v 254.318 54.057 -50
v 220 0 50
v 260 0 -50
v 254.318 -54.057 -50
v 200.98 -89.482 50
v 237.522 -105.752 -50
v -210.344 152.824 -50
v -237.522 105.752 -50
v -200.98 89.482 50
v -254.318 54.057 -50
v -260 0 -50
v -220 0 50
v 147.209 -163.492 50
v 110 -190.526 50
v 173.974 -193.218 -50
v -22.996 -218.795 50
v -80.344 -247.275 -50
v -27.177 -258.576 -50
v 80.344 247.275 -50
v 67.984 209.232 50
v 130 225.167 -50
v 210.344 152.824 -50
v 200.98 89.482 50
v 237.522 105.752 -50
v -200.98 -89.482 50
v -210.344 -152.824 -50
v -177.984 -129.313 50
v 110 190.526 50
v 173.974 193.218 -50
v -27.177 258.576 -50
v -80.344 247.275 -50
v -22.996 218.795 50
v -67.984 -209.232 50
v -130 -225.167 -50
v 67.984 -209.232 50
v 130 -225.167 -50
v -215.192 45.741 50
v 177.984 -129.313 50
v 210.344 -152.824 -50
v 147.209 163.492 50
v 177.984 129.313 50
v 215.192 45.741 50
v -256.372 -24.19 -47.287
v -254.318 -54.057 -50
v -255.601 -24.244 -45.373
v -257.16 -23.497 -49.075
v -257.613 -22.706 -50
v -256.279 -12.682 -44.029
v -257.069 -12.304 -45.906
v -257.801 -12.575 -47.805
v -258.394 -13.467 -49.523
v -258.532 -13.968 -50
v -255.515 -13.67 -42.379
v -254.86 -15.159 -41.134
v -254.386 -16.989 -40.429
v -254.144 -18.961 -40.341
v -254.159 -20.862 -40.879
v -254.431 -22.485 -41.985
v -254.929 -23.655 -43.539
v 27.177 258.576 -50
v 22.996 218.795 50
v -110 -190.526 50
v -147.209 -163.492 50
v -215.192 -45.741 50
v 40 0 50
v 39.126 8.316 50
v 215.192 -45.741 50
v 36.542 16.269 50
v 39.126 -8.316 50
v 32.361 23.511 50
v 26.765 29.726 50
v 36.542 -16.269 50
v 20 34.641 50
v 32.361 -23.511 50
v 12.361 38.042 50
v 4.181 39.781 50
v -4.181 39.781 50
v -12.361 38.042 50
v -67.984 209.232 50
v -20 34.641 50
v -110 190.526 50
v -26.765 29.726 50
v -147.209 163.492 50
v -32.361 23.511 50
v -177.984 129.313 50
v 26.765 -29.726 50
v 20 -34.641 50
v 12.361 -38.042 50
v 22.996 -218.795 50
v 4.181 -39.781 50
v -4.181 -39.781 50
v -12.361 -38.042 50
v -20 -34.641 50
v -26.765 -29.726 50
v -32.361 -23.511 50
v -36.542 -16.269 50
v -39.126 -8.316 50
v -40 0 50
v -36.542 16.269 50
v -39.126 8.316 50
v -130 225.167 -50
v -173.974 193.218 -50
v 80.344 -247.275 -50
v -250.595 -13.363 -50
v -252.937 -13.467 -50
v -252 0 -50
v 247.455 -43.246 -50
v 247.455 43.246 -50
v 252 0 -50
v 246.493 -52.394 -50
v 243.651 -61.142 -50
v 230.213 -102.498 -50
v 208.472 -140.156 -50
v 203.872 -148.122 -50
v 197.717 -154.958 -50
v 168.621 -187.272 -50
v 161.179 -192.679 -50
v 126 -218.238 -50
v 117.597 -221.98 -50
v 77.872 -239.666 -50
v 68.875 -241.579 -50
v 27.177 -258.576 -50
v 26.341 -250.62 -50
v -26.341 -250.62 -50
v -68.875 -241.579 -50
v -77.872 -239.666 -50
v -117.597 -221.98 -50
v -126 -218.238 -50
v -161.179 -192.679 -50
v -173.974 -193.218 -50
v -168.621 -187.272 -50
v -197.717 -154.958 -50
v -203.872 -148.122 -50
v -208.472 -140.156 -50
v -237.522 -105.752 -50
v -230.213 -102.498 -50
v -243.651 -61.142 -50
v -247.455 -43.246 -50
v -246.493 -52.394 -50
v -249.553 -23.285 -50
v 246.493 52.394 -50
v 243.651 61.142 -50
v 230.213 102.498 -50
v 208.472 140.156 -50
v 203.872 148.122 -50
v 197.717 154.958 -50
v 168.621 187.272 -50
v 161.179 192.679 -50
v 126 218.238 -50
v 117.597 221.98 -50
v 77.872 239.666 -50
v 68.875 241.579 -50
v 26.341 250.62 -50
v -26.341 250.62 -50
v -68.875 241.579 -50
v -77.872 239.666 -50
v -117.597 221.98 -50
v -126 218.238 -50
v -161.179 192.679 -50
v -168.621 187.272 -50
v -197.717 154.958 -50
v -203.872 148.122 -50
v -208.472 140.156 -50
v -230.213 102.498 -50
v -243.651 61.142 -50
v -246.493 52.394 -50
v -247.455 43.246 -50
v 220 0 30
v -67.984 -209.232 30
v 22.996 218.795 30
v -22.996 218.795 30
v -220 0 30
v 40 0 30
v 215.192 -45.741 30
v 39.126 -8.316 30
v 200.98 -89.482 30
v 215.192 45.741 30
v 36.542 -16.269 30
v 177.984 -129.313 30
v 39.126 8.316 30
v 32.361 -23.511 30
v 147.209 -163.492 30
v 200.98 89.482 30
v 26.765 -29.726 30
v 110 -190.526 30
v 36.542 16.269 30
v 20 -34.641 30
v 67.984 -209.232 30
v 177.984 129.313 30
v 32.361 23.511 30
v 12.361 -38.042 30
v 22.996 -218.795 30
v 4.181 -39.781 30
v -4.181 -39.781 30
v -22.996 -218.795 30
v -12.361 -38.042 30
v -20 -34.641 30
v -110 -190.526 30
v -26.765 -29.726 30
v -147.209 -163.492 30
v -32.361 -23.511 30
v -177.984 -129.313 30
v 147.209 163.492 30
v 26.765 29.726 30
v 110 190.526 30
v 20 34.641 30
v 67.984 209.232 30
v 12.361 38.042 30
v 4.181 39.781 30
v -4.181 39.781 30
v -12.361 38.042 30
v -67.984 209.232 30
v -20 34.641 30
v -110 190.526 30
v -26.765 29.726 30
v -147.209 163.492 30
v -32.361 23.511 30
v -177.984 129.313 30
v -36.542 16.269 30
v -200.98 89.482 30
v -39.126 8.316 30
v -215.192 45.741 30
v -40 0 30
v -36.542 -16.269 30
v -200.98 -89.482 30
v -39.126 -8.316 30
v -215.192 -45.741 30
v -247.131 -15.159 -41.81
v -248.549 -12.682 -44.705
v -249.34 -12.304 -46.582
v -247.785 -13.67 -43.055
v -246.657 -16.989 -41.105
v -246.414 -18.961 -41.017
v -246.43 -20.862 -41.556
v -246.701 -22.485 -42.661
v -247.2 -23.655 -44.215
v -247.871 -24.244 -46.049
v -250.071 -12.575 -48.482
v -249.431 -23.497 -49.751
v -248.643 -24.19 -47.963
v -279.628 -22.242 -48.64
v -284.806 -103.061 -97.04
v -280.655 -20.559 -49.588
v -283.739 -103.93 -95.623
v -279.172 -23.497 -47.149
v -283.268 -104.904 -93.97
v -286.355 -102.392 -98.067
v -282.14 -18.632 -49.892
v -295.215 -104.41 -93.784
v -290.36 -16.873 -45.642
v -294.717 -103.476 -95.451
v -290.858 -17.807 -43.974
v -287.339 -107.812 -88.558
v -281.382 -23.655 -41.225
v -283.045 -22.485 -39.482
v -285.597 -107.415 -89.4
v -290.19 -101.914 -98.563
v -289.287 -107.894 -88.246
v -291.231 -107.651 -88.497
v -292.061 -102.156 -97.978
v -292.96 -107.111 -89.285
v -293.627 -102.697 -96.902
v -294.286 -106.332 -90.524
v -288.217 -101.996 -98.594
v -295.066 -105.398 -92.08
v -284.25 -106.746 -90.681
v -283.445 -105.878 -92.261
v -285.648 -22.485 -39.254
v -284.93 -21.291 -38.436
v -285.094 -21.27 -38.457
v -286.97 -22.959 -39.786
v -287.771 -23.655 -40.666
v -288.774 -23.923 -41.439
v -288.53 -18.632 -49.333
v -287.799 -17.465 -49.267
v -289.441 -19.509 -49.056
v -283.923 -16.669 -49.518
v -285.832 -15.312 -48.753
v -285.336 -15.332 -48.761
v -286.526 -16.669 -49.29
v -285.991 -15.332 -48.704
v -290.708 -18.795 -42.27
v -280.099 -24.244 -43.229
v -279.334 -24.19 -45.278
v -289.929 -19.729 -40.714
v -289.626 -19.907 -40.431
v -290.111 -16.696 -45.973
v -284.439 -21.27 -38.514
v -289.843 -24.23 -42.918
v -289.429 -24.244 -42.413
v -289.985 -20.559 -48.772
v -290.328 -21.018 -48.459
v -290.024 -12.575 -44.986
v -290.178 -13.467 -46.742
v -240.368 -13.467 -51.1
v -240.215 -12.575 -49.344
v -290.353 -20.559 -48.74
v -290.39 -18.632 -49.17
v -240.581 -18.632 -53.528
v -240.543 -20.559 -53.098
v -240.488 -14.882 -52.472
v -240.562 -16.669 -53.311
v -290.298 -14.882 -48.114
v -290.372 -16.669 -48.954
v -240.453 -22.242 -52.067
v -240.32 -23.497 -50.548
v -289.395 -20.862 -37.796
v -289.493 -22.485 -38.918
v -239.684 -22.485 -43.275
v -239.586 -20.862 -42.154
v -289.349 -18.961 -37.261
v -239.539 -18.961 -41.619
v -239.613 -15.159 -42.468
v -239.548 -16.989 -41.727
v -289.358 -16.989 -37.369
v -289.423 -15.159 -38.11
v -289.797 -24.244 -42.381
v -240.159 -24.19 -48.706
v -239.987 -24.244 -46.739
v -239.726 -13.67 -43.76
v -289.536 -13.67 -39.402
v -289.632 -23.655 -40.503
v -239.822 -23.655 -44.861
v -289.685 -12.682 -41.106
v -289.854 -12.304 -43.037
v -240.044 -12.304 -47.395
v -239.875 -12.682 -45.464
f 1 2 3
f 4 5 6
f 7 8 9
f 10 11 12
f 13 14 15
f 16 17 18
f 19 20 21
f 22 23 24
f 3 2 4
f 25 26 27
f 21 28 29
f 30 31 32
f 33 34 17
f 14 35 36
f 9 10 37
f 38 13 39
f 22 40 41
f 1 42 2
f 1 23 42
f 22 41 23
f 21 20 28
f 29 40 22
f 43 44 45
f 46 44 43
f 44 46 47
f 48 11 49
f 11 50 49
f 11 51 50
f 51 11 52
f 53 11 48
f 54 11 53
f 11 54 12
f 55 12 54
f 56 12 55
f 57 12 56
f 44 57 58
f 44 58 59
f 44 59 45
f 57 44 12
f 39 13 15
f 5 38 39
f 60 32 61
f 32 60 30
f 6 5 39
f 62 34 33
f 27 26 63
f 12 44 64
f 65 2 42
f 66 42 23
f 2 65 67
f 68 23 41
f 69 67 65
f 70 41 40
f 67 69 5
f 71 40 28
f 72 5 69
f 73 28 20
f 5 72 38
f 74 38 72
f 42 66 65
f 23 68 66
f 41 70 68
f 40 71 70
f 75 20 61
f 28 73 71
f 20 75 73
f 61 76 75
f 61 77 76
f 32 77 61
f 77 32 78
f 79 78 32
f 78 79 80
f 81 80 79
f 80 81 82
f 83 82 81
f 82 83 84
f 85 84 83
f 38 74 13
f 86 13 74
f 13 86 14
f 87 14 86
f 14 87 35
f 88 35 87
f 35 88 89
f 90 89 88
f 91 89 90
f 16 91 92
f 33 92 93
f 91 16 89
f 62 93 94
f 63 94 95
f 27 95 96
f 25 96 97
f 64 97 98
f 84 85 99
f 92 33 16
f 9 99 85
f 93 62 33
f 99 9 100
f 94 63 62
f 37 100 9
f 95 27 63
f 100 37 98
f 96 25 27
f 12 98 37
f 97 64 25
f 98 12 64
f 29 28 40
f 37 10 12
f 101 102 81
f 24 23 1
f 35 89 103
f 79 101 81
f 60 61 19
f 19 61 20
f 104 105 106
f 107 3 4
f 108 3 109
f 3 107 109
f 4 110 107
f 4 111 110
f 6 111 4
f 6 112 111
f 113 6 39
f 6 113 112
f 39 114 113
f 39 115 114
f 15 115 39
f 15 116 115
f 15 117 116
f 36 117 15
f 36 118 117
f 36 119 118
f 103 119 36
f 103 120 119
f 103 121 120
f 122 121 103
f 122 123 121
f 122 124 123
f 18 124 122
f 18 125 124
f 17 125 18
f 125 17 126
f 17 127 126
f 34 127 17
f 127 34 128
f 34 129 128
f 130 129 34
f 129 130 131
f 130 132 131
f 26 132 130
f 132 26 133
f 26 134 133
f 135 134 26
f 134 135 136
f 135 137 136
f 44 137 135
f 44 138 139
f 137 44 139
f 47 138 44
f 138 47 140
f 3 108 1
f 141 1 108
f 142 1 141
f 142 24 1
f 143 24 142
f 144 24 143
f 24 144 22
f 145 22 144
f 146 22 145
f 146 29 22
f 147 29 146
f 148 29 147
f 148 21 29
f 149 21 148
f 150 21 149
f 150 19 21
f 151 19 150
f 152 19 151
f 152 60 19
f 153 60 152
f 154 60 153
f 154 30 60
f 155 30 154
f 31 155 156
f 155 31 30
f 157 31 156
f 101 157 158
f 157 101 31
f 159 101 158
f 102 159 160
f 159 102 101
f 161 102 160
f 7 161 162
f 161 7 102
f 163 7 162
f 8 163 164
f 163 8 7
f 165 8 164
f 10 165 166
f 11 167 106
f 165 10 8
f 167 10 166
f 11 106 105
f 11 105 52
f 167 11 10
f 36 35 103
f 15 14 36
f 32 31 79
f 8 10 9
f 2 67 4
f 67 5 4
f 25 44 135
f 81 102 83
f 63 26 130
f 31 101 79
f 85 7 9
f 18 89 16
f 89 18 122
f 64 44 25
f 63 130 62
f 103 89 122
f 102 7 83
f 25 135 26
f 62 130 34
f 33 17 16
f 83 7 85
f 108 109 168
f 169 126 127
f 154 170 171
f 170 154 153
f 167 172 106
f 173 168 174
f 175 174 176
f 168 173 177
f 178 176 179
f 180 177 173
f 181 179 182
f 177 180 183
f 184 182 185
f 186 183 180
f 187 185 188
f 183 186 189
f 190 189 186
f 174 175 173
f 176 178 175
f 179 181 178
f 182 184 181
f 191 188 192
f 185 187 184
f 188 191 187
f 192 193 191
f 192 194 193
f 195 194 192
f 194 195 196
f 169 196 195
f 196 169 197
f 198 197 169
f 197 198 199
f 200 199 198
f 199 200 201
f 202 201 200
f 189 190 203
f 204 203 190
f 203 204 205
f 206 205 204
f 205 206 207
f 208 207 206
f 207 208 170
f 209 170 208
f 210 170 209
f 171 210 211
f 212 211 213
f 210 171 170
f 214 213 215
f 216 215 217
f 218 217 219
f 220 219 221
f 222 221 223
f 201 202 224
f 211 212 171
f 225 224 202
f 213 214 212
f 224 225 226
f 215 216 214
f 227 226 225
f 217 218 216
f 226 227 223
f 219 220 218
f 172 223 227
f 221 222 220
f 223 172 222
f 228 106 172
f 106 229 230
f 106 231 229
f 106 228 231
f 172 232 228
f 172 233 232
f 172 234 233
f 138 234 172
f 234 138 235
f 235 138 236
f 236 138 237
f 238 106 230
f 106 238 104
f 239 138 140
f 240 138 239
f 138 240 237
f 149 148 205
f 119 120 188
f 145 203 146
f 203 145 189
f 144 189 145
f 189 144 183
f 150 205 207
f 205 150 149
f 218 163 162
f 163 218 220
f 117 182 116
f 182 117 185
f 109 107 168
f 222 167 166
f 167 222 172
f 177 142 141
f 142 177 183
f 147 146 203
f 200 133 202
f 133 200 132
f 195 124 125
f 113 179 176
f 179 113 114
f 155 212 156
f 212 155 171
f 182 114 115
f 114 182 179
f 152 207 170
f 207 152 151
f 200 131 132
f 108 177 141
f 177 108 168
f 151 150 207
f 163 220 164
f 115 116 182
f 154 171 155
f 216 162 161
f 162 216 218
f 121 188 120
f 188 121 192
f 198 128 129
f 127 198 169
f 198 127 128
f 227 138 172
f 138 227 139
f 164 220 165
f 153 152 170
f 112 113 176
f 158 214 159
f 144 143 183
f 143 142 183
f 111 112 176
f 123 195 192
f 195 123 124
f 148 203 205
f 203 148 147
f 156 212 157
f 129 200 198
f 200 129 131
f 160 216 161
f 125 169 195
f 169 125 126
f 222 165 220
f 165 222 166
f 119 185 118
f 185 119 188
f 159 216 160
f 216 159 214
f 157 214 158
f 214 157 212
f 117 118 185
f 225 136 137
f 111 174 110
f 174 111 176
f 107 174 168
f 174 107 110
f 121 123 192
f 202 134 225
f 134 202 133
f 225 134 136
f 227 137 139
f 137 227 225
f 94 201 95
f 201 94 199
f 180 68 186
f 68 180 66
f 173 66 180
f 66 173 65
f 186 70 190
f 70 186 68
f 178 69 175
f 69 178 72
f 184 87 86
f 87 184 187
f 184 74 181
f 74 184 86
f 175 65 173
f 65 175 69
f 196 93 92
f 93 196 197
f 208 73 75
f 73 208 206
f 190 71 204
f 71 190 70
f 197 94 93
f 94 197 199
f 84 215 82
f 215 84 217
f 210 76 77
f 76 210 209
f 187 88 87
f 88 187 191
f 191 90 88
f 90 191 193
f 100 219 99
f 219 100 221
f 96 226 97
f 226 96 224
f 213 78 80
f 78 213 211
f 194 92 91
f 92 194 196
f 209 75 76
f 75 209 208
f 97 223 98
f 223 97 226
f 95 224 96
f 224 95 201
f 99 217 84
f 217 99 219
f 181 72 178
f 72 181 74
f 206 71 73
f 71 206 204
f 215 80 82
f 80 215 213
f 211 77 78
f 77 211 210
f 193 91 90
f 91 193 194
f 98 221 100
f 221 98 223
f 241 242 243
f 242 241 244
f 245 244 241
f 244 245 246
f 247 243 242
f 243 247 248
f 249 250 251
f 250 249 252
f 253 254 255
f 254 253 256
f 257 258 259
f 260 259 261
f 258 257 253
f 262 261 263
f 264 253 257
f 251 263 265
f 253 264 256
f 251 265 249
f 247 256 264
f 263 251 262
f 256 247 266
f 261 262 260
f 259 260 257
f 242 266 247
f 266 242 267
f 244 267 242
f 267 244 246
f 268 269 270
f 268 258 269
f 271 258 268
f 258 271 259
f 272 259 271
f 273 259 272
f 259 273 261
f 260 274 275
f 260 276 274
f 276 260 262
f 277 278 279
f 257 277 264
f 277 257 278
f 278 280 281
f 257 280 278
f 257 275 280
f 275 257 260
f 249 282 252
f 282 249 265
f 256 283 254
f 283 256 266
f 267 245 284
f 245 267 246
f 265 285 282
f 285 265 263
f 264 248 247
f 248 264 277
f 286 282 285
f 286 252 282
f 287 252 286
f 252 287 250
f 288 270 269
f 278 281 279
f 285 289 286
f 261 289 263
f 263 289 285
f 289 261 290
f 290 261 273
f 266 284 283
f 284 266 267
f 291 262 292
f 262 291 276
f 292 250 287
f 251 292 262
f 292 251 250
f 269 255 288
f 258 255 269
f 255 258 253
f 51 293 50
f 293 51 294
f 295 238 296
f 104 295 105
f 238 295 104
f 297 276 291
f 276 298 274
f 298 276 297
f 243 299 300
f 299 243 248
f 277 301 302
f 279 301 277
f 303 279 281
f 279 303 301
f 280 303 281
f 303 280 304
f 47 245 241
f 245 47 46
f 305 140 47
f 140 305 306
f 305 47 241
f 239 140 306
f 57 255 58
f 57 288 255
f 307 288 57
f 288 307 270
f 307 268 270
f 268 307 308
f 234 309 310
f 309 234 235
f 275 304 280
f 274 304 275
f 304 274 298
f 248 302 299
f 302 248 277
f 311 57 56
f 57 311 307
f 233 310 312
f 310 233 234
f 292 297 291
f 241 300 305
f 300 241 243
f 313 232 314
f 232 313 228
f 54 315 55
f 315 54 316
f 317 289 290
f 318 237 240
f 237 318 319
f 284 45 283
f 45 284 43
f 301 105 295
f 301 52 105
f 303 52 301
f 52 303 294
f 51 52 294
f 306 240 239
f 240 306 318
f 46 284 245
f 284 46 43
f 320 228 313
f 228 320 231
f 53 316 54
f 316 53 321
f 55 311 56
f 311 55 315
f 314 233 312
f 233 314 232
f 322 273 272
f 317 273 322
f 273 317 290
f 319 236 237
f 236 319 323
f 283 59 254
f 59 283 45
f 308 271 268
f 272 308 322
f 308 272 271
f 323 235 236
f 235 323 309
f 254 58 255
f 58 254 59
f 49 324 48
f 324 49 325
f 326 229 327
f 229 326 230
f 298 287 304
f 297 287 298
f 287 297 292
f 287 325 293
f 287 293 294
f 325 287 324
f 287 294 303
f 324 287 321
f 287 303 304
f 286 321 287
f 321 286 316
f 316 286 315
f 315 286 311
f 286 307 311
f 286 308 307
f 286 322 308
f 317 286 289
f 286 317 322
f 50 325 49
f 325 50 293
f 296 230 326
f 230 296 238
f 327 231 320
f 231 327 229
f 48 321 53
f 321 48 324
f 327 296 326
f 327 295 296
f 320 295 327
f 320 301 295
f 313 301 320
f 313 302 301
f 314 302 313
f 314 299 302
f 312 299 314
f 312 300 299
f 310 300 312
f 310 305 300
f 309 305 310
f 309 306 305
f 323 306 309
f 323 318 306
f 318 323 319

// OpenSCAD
module hook(){
	cylinder(100,6,6,true);
	rotate([0,90,0]) translate([-50,0,20]) cylinder(50,6,6,true);
}



difference(){
	cylinder(100,260,220,true);
	translate([0,0,-20]) cylinder(100,260,220,true);
	cylinder(150,40,40,true);
	
}
rotate([-60,5,0]) translate([-280,50,-100]) hook();
